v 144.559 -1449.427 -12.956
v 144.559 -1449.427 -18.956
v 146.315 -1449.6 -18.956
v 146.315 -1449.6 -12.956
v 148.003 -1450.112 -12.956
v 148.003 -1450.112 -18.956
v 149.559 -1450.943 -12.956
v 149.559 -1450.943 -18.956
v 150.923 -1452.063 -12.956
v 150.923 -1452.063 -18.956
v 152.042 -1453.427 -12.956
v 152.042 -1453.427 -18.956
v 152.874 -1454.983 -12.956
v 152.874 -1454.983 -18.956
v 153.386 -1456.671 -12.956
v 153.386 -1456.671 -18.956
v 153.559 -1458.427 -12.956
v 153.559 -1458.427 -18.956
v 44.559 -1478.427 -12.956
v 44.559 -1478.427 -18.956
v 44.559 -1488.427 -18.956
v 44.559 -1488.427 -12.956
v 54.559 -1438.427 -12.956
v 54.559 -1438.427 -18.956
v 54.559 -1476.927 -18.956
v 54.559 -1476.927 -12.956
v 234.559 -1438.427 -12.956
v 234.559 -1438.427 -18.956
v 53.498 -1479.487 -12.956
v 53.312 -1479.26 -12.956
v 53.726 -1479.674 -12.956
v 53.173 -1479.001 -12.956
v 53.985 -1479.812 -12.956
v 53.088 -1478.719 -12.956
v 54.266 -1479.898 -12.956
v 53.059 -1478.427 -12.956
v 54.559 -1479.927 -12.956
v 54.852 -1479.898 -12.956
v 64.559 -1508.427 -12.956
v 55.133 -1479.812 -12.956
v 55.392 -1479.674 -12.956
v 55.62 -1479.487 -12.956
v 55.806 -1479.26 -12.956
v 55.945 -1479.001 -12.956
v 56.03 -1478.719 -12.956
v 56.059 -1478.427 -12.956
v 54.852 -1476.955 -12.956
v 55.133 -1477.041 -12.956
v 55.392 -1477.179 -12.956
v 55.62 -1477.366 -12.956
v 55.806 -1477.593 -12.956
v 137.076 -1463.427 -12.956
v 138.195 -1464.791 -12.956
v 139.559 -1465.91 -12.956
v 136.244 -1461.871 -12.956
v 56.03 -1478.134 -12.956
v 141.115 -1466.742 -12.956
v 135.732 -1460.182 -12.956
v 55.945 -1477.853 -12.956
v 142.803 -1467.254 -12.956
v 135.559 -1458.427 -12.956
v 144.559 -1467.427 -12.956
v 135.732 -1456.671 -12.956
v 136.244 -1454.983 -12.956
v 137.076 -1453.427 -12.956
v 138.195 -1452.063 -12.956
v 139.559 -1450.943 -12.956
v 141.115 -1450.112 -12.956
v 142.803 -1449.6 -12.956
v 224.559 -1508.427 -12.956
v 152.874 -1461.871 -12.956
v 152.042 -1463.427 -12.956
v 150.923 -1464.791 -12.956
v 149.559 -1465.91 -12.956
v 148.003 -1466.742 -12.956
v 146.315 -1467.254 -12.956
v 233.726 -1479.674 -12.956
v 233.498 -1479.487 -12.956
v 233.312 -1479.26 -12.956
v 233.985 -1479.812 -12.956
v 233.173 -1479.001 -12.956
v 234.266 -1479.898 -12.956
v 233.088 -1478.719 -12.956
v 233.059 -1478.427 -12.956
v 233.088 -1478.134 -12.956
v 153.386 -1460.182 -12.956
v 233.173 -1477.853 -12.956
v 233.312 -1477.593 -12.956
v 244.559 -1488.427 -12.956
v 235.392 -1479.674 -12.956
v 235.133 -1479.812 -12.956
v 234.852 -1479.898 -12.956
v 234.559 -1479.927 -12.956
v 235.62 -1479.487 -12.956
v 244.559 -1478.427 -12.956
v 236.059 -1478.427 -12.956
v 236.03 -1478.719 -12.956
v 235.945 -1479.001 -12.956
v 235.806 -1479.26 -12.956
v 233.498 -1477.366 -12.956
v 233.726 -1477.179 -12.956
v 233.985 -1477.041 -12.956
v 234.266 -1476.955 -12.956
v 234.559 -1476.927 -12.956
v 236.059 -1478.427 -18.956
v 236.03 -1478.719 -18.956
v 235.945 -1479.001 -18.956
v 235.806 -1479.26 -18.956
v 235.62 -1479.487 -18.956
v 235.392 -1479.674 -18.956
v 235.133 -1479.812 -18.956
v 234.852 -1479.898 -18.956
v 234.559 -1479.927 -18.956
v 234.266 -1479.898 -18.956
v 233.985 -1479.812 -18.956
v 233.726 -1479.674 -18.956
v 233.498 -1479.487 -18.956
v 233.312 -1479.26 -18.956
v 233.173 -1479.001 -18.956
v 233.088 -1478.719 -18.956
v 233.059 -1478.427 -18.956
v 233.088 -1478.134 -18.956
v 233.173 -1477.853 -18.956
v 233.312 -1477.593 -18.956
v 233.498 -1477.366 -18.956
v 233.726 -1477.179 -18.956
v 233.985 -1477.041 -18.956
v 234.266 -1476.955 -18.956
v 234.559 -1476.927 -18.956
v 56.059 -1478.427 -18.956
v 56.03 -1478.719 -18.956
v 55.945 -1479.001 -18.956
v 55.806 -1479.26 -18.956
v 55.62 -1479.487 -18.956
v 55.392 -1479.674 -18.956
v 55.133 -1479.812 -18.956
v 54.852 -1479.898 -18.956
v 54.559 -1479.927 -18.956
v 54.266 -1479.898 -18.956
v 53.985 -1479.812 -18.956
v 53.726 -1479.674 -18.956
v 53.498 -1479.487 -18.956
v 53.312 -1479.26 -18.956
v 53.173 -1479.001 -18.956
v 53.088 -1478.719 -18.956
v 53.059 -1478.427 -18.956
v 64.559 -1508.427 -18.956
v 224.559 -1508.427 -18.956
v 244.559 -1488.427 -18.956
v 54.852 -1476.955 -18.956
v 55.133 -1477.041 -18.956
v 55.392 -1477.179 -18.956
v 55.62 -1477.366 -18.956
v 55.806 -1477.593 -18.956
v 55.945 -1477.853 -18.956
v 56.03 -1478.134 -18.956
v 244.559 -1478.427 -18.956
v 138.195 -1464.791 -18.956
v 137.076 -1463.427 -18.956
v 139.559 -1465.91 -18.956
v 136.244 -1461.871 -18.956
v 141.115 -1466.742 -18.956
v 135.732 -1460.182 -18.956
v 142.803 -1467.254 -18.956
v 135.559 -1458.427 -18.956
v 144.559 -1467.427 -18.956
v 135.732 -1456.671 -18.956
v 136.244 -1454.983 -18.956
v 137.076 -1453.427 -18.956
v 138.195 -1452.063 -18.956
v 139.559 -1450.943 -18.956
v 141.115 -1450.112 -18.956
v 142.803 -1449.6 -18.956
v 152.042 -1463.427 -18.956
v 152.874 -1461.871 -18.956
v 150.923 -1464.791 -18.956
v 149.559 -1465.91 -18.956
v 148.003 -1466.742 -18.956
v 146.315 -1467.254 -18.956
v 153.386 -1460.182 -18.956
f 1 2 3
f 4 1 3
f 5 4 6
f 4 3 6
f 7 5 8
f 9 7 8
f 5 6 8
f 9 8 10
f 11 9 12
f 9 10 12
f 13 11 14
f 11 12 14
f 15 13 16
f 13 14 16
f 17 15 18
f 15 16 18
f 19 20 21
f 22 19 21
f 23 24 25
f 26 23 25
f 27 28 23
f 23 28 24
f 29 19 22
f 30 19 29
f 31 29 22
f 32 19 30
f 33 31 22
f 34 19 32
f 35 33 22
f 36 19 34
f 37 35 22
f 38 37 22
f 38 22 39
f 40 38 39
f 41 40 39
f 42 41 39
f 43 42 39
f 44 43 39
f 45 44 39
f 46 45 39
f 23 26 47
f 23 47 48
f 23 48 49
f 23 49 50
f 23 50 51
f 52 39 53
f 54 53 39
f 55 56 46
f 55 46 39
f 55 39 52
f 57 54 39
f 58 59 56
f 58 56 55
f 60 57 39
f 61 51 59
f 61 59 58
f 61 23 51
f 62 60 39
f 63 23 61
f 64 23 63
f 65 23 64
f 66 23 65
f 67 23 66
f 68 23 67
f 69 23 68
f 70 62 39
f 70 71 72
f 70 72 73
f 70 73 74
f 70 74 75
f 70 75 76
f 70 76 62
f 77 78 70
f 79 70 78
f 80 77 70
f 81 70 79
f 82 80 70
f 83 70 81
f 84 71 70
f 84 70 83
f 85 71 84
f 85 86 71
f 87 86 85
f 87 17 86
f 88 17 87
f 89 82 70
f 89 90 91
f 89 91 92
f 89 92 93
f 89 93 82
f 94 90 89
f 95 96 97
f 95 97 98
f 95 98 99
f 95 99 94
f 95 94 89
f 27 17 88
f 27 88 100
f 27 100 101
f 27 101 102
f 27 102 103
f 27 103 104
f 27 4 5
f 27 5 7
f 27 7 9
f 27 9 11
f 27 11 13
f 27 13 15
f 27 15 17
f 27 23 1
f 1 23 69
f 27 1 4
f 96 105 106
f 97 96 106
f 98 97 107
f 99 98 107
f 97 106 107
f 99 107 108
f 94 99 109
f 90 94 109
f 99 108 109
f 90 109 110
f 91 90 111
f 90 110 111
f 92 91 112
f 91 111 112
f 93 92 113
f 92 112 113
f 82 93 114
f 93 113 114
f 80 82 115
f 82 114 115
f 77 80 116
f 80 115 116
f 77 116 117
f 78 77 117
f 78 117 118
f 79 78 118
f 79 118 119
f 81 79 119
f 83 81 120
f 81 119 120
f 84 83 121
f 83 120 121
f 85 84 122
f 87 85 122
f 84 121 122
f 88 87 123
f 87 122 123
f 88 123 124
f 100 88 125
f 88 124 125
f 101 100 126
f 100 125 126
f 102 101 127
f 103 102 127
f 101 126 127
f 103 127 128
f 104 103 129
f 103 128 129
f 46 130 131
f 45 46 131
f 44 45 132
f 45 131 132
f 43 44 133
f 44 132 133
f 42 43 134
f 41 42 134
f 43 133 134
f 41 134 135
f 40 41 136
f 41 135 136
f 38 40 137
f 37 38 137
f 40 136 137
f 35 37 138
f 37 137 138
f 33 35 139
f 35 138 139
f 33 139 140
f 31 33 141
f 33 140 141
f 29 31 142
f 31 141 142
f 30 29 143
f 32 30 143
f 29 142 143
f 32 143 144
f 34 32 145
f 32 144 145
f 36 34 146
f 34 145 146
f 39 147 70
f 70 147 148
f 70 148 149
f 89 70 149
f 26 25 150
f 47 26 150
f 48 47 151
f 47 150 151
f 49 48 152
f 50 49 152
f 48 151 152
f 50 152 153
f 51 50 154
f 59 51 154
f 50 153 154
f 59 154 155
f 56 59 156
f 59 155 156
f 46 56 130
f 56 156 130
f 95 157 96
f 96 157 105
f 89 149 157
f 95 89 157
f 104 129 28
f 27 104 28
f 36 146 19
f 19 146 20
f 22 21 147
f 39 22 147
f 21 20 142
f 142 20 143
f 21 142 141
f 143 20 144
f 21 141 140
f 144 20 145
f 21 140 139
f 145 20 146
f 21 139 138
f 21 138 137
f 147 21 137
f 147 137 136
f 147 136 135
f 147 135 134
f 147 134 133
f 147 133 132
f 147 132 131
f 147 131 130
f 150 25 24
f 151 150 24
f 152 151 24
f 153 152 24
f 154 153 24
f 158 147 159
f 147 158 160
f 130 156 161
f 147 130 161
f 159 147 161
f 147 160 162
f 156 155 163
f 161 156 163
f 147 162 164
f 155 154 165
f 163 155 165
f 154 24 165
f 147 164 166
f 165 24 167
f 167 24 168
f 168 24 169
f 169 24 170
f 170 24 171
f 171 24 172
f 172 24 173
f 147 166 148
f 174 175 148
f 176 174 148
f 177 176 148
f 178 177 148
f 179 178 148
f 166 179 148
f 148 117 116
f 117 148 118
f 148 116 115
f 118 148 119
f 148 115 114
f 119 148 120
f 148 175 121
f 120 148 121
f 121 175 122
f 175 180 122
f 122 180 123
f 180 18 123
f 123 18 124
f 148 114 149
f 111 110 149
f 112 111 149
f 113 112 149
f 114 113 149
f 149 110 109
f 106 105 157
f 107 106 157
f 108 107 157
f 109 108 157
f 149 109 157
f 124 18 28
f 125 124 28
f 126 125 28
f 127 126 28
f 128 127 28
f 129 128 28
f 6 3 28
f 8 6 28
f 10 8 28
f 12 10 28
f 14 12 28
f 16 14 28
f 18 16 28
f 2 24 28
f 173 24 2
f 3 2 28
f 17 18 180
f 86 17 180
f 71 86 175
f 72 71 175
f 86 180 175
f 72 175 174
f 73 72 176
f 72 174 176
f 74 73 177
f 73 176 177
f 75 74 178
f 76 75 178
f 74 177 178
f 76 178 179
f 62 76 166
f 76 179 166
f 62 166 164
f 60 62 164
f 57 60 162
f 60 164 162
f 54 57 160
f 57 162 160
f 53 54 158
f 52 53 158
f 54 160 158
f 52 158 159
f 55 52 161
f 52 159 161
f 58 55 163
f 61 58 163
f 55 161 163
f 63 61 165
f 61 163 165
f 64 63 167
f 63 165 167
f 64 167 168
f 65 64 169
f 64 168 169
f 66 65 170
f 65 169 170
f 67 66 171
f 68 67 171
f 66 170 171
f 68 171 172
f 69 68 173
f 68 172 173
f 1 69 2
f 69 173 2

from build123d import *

# Parameters (mm, degrees)
BOSS_EXTRUDE1_START = -18.956398
BOSS_EXTRUDE1_DEPTH = 6.000001


with BuildPart() as part:
    # Sketch1 → Boss-Extrude1 (new body)
    with BuildSketch(Plane.XY.offset(BOSS_EXTRUDE1_START)):
        with BuildLine():
            Line((144.558896816, -1449.426665995), (144.558896816, -1438.426665995))
            Line((144.558896816, -1438.426665995), (54.558896816, -1438.426665995))
            Line((54.558896816, -1438.426665995), (54.558896816, -1476.926665995))
            ThreePointArc((54.558896816, -1476.926665995), (55.619556988, -1477.366005823), (56.058896816, -1478.426665995))
            ThreePointArc((56.058896816, -1478.426665995), (54.558896816, -1479.926665995), (53.058896816, -1478.426665995))
            Line((53.058896816, -1478.426665995), (44.558896816, -1478.426665995))
            Line((44.558896816, -1478.426665995), (44.558896816, -1488.426665995))
            Line((44.558896816, -1488.426665995), (64.558896816, -1508.426665995))
            Line((64.558896816, -1508.426665995), (144.558896816, -1508.426665995))
            Line((144.558896816, -1508.426665995), (144.558896816, -1467.426665995))
            ThreePointArc((144.558896816, -1467.426665995), (135.558896816, -1458.426665995), (144.558896816, -1449.426665995))
        make_face()
        with BuildLine():
            Line((234.558896816, -1438.426665995), (144.558896816, -1438.426665995))
            Line((144.558896816, -1438.426665995), (144.558896816, -1449.426665995))
            ThreePointArc((144.558896816, -1449.426665995), (150.922857847, -1452.062704964), (153.558896816, -1458.426665995))
            ThreePointArc((153.558896816, -1458.426665995), (150.922857847, -1464.790627025), (144.558896816, -1467.426665995))
            Line((144.558896816, -1467.426665995), (144.558896816, -1508.426665995))
            Line((144.558896816, -1508.426665995), (224.558896816, -1508.426665995))
            Line((224.558896816, -1508.426665995), (244.558896816, -1488.426665995))
            Line((244.558896816, -1488.426665995), (244.558896816, -1478.426665995))
            Line((244.558896816, -1478.426665995), (236.058896816, -1478.426665995))
            ThreePointArc((236.058896816, -1478.426665995), (233.498236645, -1479.487326167), (234.558896816, -1476.926665995))
            Line((234.558896816, -1476.926665995), (234.558896816, -1438.426665995))
        make_face()
    extrude(amount=BOSS_EXTRUDE1_DEPTH)


solid = part.part
